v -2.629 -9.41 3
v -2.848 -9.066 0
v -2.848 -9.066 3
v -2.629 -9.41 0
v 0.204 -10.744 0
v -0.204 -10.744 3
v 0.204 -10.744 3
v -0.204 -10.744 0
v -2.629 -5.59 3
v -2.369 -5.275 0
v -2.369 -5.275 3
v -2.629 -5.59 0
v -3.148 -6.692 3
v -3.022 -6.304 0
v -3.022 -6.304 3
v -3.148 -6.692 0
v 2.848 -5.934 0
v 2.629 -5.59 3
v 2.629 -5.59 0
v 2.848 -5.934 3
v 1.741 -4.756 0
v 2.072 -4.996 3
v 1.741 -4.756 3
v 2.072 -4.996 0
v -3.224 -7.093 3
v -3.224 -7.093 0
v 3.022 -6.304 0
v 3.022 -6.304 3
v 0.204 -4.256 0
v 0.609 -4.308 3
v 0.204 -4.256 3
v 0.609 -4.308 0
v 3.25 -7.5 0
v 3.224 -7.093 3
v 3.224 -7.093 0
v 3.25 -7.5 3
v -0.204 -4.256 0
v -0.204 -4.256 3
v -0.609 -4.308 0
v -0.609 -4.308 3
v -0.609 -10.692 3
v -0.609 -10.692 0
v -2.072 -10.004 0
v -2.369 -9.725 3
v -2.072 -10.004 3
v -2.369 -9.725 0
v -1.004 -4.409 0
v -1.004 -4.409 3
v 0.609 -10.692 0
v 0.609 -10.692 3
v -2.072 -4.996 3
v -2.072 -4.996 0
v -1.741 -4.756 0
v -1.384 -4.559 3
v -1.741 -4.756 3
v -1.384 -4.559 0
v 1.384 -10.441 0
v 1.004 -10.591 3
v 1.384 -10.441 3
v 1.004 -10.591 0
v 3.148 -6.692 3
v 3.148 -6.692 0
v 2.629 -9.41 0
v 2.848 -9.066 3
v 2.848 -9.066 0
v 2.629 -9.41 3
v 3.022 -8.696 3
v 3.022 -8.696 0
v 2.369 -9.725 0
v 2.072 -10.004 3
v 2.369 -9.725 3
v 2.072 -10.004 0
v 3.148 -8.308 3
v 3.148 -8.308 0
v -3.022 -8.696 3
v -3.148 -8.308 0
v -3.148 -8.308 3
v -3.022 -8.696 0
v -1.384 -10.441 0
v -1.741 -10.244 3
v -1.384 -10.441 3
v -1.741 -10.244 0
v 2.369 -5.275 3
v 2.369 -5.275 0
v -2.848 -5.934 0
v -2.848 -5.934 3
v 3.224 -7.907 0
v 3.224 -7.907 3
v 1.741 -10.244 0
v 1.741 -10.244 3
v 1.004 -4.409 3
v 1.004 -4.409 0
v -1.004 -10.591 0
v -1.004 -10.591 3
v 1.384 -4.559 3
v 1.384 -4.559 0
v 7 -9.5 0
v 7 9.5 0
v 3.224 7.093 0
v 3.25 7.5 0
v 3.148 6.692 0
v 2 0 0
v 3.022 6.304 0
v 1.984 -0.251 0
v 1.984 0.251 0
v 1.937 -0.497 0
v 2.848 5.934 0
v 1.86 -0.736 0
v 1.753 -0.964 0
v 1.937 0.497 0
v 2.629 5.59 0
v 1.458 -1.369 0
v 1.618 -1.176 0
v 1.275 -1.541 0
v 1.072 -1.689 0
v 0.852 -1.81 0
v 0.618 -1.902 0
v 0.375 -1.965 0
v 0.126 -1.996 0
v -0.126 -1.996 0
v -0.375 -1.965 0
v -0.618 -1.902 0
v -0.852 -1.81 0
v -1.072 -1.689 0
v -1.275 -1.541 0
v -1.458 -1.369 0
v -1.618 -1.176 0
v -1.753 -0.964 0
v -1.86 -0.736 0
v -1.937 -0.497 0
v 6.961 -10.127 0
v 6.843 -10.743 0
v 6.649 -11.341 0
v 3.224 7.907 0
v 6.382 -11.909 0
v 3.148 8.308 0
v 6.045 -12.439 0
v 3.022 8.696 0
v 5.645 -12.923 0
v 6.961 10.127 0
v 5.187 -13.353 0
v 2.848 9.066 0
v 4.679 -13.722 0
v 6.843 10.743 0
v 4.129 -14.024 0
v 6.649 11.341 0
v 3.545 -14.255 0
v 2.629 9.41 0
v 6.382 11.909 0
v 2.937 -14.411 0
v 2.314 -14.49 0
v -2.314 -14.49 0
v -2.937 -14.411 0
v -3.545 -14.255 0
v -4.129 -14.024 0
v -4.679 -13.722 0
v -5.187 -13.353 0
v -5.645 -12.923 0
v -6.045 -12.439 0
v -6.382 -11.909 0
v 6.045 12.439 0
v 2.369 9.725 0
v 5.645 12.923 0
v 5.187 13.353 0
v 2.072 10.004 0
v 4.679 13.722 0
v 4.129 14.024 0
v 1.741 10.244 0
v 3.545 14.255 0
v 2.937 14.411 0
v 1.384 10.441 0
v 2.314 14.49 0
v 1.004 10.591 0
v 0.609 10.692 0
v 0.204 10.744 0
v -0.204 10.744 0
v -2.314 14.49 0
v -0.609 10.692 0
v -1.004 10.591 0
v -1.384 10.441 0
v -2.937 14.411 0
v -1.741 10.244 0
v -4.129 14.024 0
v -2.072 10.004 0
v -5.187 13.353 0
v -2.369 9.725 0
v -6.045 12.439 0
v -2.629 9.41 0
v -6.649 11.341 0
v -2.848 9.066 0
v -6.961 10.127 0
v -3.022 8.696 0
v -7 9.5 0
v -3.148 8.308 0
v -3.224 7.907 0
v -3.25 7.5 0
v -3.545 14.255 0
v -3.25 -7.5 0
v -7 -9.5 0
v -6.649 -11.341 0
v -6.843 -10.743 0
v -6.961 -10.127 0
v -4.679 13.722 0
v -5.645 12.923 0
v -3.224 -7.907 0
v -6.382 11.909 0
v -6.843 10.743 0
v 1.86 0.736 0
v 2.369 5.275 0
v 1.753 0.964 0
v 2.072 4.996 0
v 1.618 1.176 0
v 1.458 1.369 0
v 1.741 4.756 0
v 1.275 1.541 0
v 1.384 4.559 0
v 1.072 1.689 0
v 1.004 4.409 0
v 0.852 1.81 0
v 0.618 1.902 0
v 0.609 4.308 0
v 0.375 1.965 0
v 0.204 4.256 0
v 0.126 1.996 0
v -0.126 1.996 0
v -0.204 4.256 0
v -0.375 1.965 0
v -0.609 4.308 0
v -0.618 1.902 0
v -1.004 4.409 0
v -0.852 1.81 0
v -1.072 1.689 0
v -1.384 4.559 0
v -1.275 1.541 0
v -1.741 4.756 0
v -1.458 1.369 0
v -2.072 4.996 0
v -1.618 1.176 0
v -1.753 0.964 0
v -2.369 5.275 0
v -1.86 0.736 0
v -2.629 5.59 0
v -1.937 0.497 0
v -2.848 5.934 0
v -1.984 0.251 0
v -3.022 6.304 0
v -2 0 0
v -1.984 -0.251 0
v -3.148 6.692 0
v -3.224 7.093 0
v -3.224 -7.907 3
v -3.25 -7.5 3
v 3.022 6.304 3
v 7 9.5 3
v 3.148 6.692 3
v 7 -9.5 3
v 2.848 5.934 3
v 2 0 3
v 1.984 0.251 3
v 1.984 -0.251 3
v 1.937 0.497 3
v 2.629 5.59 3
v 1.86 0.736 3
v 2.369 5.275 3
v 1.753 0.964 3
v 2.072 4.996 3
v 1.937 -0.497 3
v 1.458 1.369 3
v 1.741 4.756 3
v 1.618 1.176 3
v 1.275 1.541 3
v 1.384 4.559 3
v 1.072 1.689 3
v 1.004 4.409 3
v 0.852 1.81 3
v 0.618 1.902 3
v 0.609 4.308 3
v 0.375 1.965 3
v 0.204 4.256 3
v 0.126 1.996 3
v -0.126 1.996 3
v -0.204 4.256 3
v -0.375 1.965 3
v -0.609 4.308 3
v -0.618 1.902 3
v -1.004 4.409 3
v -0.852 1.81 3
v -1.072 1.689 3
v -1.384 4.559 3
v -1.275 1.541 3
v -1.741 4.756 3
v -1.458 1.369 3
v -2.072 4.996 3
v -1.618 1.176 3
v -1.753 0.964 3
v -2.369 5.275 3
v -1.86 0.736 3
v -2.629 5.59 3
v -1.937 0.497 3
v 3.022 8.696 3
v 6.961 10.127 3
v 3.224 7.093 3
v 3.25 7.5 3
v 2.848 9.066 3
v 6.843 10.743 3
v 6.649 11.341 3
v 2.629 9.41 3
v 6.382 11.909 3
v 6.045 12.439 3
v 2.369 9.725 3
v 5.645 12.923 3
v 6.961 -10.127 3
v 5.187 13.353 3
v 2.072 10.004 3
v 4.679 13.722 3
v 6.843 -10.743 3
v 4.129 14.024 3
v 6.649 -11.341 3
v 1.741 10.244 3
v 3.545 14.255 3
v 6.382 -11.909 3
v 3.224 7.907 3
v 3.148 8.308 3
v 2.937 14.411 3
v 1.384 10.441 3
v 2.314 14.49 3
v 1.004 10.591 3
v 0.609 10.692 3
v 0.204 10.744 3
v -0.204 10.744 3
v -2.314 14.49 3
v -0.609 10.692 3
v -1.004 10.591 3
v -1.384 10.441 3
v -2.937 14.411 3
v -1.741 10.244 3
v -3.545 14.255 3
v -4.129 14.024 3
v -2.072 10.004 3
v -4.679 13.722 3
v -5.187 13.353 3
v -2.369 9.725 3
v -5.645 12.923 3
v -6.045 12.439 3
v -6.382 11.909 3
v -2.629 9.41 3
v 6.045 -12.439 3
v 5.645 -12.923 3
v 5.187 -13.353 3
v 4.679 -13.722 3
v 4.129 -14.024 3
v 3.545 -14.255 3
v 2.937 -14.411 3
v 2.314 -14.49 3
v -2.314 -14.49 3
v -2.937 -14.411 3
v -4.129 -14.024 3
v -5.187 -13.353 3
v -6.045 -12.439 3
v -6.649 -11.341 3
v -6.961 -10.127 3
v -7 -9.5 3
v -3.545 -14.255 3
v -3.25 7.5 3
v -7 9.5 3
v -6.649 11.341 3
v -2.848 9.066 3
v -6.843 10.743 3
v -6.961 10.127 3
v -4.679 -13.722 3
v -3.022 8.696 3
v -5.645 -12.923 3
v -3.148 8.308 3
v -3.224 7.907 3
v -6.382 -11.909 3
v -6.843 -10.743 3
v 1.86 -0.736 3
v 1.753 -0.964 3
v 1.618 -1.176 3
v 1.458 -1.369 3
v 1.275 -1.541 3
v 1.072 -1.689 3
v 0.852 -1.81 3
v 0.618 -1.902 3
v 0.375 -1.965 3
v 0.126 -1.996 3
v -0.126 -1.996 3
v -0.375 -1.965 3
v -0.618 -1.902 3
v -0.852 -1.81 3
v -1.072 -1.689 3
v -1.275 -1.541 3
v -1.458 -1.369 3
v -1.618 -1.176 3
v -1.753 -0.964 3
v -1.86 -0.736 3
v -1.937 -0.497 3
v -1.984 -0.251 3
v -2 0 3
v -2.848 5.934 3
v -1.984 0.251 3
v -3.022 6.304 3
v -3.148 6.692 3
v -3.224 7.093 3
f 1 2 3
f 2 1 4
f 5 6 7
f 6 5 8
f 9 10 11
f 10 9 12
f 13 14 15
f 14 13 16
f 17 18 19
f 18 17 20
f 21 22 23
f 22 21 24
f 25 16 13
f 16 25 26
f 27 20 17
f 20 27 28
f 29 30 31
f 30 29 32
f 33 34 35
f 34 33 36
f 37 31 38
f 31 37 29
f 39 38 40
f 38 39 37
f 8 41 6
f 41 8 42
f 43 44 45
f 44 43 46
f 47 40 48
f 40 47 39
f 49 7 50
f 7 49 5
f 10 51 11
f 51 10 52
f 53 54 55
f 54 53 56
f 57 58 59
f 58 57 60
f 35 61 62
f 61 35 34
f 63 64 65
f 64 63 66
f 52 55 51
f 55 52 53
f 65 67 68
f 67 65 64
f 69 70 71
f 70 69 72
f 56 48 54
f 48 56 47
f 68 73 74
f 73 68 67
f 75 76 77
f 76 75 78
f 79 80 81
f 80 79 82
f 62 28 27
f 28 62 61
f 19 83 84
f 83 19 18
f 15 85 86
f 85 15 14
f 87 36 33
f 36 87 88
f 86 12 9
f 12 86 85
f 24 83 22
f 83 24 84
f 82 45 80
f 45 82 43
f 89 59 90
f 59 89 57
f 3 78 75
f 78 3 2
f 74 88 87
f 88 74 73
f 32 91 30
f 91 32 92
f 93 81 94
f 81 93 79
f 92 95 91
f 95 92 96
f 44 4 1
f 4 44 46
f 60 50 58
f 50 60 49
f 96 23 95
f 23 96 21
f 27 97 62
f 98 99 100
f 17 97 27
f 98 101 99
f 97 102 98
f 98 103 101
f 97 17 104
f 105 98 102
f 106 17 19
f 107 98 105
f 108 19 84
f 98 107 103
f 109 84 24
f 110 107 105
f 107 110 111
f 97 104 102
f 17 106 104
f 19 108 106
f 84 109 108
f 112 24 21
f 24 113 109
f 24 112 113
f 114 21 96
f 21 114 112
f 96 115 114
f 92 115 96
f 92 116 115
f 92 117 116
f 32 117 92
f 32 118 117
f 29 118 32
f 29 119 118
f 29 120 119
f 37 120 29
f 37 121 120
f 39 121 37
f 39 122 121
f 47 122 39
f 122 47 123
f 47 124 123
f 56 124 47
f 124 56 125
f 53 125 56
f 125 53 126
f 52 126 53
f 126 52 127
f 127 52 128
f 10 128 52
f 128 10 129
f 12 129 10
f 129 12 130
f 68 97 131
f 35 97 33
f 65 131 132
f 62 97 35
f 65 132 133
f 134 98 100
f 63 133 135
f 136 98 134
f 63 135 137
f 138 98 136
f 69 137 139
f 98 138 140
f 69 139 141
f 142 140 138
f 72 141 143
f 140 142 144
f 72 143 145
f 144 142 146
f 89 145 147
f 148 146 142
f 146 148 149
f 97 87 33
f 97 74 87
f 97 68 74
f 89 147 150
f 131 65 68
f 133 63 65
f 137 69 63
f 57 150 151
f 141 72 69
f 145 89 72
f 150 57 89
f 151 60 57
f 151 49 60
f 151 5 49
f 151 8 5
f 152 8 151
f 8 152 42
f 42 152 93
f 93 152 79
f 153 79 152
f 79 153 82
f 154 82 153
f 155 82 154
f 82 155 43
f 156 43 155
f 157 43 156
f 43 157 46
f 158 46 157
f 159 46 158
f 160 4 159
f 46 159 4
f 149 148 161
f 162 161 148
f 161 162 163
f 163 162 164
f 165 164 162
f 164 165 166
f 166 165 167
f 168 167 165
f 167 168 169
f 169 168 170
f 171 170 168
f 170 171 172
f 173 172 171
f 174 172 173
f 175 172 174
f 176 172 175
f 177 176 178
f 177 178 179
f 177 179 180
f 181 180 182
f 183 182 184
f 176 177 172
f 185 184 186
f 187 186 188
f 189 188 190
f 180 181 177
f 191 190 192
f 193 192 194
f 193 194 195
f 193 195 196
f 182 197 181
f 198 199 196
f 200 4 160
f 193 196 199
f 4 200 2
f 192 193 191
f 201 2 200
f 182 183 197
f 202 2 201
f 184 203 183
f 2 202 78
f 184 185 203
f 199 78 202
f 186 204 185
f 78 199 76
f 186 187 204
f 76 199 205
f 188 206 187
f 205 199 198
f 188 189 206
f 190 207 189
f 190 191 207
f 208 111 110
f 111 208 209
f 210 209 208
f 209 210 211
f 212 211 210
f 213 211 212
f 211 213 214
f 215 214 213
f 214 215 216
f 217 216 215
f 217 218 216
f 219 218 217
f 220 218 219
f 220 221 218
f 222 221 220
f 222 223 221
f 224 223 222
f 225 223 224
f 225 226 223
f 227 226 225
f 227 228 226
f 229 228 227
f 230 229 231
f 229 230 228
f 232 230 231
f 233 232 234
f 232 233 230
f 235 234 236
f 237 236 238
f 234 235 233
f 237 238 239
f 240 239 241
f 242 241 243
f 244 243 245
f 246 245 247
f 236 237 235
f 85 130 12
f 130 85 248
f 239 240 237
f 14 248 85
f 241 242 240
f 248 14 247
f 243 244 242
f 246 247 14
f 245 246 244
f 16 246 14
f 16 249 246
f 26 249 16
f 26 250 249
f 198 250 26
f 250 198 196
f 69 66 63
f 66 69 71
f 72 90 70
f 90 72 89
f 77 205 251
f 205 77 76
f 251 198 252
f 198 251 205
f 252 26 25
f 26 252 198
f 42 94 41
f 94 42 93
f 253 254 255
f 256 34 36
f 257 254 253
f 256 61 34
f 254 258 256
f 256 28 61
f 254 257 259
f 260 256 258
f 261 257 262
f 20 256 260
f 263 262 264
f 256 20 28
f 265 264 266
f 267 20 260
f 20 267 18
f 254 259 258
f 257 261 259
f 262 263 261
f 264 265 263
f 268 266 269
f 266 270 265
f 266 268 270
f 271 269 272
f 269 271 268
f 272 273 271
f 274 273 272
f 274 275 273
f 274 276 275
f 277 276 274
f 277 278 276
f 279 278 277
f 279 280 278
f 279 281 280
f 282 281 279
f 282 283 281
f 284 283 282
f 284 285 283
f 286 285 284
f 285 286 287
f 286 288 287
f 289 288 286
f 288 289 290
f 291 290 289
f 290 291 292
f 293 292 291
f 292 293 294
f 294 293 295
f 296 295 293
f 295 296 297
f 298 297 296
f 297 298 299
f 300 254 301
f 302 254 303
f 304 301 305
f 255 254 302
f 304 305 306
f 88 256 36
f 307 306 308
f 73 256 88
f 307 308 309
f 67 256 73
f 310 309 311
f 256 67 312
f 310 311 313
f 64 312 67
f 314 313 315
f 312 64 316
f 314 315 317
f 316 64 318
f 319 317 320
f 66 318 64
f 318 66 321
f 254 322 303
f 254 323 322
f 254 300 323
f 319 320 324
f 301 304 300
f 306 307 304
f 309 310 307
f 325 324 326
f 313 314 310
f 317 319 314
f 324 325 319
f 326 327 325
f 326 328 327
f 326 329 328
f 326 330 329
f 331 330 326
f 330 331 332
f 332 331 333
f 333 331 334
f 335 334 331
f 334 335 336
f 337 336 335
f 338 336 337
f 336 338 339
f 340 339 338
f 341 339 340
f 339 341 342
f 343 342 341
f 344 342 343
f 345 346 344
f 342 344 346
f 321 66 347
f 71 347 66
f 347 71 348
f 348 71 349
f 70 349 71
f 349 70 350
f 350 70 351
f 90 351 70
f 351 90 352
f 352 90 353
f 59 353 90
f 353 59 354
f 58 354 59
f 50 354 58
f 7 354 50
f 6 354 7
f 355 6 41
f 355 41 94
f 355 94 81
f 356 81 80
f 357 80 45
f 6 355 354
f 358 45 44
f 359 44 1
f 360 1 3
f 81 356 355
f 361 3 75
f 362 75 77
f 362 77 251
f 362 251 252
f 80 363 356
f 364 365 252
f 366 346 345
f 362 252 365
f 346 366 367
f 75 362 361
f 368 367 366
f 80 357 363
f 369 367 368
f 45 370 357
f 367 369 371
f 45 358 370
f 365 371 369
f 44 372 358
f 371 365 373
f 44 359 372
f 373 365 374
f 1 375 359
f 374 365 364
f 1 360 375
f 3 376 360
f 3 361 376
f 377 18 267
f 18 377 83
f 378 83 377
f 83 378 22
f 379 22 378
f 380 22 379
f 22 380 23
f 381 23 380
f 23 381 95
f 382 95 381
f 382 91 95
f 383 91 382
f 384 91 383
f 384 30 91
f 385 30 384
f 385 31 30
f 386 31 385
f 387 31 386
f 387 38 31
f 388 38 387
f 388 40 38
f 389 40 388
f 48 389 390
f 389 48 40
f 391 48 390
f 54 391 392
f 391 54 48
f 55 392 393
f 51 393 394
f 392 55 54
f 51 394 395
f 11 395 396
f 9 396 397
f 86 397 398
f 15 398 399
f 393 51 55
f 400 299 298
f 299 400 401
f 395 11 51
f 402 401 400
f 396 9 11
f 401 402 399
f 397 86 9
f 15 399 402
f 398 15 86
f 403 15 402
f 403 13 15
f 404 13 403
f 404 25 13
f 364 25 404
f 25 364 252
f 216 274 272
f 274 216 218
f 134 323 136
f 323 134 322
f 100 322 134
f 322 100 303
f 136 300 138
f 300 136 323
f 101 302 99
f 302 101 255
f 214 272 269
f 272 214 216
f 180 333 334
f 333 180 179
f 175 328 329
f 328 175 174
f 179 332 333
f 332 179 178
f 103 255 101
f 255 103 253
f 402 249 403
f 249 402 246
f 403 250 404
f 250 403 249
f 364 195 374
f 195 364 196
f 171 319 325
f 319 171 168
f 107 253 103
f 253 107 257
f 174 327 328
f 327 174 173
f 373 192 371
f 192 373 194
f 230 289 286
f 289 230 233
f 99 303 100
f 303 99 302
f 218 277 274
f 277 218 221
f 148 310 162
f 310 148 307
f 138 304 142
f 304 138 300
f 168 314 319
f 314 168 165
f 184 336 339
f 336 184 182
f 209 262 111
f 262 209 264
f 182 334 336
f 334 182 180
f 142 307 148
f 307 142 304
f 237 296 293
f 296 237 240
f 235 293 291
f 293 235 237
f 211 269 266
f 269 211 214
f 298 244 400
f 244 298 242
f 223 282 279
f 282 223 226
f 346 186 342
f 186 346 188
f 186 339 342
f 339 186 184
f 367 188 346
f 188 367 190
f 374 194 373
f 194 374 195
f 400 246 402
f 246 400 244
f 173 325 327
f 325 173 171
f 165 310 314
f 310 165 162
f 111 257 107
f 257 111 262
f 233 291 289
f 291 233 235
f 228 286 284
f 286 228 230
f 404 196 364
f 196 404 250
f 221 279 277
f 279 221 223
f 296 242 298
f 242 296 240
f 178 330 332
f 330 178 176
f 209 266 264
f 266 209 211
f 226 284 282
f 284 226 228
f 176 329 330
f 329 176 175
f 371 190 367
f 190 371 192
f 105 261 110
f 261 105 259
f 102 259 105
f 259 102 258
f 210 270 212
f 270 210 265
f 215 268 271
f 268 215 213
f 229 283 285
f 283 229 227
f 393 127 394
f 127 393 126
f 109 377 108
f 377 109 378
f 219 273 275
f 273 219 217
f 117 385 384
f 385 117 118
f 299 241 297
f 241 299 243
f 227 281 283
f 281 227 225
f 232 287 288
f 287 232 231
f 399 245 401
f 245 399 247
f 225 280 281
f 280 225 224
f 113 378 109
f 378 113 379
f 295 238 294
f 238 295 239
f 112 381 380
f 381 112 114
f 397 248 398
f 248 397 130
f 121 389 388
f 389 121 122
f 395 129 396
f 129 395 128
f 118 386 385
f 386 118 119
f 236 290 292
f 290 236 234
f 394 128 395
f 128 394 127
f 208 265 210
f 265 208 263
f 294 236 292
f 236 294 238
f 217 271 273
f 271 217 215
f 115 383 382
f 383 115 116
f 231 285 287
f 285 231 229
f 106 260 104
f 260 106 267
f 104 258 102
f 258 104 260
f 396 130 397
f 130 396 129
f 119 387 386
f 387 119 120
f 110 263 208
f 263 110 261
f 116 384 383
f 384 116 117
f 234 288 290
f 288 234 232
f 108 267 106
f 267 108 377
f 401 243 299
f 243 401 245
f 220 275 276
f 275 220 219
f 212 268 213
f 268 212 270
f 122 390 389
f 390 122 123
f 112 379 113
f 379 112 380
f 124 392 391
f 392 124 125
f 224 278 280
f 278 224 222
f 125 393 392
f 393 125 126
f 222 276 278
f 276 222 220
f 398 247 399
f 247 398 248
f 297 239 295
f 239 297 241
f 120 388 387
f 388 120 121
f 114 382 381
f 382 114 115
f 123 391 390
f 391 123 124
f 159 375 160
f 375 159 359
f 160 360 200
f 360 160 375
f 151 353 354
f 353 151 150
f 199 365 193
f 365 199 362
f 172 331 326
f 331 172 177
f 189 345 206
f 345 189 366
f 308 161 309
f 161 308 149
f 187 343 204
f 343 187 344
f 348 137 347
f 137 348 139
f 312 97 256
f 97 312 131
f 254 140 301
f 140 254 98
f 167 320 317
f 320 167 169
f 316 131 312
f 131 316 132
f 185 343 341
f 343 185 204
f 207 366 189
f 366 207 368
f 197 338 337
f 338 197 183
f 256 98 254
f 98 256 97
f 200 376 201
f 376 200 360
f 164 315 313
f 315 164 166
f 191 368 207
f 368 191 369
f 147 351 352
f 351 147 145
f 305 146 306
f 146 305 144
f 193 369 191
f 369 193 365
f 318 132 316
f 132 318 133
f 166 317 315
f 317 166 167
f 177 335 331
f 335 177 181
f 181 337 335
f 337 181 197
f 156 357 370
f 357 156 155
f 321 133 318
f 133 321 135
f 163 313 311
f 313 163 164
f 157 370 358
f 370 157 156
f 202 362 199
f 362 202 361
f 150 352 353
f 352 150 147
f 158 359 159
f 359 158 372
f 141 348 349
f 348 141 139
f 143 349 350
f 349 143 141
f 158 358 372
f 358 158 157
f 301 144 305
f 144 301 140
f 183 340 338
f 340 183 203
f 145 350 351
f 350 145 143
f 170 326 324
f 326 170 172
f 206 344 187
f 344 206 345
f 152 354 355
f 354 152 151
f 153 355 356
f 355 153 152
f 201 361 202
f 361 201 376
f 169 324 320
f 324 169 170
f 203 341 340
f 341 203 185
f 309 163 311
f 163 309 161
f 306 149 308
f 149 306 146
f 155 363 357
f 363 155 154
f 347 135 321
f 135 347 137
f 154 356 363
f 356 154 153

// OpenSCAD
$fn = 50;

difference() {
	union() {
		hull() {
			translate(v = [-2.0, 9.5, 0]) {
				cylinder(h = 3, r = 5);
			}
			translate(v = [2.0, 9.5, 0]) {
				cylinder(h = 3, r = 5);
			}
			translate(v = [-2.0, -9.5, 0]) {
				cylinder(h = 3, r = 5);
			}
			translate(v = [2.0, -9.5, 0]) {
				cylinder(h = 3, r = 5);
			}
		}
	}
	union() {
		translate(v = [0.0, -7.5, 0]) {
			cylinder(h = 3, r = 3.25);
		}
		translate(v = [0.0, 7.5, 0]) {
			cylinder(h = 3, r = 3.25);
		}
		cylinder(h = 3, r = 2.0);
	}
}
